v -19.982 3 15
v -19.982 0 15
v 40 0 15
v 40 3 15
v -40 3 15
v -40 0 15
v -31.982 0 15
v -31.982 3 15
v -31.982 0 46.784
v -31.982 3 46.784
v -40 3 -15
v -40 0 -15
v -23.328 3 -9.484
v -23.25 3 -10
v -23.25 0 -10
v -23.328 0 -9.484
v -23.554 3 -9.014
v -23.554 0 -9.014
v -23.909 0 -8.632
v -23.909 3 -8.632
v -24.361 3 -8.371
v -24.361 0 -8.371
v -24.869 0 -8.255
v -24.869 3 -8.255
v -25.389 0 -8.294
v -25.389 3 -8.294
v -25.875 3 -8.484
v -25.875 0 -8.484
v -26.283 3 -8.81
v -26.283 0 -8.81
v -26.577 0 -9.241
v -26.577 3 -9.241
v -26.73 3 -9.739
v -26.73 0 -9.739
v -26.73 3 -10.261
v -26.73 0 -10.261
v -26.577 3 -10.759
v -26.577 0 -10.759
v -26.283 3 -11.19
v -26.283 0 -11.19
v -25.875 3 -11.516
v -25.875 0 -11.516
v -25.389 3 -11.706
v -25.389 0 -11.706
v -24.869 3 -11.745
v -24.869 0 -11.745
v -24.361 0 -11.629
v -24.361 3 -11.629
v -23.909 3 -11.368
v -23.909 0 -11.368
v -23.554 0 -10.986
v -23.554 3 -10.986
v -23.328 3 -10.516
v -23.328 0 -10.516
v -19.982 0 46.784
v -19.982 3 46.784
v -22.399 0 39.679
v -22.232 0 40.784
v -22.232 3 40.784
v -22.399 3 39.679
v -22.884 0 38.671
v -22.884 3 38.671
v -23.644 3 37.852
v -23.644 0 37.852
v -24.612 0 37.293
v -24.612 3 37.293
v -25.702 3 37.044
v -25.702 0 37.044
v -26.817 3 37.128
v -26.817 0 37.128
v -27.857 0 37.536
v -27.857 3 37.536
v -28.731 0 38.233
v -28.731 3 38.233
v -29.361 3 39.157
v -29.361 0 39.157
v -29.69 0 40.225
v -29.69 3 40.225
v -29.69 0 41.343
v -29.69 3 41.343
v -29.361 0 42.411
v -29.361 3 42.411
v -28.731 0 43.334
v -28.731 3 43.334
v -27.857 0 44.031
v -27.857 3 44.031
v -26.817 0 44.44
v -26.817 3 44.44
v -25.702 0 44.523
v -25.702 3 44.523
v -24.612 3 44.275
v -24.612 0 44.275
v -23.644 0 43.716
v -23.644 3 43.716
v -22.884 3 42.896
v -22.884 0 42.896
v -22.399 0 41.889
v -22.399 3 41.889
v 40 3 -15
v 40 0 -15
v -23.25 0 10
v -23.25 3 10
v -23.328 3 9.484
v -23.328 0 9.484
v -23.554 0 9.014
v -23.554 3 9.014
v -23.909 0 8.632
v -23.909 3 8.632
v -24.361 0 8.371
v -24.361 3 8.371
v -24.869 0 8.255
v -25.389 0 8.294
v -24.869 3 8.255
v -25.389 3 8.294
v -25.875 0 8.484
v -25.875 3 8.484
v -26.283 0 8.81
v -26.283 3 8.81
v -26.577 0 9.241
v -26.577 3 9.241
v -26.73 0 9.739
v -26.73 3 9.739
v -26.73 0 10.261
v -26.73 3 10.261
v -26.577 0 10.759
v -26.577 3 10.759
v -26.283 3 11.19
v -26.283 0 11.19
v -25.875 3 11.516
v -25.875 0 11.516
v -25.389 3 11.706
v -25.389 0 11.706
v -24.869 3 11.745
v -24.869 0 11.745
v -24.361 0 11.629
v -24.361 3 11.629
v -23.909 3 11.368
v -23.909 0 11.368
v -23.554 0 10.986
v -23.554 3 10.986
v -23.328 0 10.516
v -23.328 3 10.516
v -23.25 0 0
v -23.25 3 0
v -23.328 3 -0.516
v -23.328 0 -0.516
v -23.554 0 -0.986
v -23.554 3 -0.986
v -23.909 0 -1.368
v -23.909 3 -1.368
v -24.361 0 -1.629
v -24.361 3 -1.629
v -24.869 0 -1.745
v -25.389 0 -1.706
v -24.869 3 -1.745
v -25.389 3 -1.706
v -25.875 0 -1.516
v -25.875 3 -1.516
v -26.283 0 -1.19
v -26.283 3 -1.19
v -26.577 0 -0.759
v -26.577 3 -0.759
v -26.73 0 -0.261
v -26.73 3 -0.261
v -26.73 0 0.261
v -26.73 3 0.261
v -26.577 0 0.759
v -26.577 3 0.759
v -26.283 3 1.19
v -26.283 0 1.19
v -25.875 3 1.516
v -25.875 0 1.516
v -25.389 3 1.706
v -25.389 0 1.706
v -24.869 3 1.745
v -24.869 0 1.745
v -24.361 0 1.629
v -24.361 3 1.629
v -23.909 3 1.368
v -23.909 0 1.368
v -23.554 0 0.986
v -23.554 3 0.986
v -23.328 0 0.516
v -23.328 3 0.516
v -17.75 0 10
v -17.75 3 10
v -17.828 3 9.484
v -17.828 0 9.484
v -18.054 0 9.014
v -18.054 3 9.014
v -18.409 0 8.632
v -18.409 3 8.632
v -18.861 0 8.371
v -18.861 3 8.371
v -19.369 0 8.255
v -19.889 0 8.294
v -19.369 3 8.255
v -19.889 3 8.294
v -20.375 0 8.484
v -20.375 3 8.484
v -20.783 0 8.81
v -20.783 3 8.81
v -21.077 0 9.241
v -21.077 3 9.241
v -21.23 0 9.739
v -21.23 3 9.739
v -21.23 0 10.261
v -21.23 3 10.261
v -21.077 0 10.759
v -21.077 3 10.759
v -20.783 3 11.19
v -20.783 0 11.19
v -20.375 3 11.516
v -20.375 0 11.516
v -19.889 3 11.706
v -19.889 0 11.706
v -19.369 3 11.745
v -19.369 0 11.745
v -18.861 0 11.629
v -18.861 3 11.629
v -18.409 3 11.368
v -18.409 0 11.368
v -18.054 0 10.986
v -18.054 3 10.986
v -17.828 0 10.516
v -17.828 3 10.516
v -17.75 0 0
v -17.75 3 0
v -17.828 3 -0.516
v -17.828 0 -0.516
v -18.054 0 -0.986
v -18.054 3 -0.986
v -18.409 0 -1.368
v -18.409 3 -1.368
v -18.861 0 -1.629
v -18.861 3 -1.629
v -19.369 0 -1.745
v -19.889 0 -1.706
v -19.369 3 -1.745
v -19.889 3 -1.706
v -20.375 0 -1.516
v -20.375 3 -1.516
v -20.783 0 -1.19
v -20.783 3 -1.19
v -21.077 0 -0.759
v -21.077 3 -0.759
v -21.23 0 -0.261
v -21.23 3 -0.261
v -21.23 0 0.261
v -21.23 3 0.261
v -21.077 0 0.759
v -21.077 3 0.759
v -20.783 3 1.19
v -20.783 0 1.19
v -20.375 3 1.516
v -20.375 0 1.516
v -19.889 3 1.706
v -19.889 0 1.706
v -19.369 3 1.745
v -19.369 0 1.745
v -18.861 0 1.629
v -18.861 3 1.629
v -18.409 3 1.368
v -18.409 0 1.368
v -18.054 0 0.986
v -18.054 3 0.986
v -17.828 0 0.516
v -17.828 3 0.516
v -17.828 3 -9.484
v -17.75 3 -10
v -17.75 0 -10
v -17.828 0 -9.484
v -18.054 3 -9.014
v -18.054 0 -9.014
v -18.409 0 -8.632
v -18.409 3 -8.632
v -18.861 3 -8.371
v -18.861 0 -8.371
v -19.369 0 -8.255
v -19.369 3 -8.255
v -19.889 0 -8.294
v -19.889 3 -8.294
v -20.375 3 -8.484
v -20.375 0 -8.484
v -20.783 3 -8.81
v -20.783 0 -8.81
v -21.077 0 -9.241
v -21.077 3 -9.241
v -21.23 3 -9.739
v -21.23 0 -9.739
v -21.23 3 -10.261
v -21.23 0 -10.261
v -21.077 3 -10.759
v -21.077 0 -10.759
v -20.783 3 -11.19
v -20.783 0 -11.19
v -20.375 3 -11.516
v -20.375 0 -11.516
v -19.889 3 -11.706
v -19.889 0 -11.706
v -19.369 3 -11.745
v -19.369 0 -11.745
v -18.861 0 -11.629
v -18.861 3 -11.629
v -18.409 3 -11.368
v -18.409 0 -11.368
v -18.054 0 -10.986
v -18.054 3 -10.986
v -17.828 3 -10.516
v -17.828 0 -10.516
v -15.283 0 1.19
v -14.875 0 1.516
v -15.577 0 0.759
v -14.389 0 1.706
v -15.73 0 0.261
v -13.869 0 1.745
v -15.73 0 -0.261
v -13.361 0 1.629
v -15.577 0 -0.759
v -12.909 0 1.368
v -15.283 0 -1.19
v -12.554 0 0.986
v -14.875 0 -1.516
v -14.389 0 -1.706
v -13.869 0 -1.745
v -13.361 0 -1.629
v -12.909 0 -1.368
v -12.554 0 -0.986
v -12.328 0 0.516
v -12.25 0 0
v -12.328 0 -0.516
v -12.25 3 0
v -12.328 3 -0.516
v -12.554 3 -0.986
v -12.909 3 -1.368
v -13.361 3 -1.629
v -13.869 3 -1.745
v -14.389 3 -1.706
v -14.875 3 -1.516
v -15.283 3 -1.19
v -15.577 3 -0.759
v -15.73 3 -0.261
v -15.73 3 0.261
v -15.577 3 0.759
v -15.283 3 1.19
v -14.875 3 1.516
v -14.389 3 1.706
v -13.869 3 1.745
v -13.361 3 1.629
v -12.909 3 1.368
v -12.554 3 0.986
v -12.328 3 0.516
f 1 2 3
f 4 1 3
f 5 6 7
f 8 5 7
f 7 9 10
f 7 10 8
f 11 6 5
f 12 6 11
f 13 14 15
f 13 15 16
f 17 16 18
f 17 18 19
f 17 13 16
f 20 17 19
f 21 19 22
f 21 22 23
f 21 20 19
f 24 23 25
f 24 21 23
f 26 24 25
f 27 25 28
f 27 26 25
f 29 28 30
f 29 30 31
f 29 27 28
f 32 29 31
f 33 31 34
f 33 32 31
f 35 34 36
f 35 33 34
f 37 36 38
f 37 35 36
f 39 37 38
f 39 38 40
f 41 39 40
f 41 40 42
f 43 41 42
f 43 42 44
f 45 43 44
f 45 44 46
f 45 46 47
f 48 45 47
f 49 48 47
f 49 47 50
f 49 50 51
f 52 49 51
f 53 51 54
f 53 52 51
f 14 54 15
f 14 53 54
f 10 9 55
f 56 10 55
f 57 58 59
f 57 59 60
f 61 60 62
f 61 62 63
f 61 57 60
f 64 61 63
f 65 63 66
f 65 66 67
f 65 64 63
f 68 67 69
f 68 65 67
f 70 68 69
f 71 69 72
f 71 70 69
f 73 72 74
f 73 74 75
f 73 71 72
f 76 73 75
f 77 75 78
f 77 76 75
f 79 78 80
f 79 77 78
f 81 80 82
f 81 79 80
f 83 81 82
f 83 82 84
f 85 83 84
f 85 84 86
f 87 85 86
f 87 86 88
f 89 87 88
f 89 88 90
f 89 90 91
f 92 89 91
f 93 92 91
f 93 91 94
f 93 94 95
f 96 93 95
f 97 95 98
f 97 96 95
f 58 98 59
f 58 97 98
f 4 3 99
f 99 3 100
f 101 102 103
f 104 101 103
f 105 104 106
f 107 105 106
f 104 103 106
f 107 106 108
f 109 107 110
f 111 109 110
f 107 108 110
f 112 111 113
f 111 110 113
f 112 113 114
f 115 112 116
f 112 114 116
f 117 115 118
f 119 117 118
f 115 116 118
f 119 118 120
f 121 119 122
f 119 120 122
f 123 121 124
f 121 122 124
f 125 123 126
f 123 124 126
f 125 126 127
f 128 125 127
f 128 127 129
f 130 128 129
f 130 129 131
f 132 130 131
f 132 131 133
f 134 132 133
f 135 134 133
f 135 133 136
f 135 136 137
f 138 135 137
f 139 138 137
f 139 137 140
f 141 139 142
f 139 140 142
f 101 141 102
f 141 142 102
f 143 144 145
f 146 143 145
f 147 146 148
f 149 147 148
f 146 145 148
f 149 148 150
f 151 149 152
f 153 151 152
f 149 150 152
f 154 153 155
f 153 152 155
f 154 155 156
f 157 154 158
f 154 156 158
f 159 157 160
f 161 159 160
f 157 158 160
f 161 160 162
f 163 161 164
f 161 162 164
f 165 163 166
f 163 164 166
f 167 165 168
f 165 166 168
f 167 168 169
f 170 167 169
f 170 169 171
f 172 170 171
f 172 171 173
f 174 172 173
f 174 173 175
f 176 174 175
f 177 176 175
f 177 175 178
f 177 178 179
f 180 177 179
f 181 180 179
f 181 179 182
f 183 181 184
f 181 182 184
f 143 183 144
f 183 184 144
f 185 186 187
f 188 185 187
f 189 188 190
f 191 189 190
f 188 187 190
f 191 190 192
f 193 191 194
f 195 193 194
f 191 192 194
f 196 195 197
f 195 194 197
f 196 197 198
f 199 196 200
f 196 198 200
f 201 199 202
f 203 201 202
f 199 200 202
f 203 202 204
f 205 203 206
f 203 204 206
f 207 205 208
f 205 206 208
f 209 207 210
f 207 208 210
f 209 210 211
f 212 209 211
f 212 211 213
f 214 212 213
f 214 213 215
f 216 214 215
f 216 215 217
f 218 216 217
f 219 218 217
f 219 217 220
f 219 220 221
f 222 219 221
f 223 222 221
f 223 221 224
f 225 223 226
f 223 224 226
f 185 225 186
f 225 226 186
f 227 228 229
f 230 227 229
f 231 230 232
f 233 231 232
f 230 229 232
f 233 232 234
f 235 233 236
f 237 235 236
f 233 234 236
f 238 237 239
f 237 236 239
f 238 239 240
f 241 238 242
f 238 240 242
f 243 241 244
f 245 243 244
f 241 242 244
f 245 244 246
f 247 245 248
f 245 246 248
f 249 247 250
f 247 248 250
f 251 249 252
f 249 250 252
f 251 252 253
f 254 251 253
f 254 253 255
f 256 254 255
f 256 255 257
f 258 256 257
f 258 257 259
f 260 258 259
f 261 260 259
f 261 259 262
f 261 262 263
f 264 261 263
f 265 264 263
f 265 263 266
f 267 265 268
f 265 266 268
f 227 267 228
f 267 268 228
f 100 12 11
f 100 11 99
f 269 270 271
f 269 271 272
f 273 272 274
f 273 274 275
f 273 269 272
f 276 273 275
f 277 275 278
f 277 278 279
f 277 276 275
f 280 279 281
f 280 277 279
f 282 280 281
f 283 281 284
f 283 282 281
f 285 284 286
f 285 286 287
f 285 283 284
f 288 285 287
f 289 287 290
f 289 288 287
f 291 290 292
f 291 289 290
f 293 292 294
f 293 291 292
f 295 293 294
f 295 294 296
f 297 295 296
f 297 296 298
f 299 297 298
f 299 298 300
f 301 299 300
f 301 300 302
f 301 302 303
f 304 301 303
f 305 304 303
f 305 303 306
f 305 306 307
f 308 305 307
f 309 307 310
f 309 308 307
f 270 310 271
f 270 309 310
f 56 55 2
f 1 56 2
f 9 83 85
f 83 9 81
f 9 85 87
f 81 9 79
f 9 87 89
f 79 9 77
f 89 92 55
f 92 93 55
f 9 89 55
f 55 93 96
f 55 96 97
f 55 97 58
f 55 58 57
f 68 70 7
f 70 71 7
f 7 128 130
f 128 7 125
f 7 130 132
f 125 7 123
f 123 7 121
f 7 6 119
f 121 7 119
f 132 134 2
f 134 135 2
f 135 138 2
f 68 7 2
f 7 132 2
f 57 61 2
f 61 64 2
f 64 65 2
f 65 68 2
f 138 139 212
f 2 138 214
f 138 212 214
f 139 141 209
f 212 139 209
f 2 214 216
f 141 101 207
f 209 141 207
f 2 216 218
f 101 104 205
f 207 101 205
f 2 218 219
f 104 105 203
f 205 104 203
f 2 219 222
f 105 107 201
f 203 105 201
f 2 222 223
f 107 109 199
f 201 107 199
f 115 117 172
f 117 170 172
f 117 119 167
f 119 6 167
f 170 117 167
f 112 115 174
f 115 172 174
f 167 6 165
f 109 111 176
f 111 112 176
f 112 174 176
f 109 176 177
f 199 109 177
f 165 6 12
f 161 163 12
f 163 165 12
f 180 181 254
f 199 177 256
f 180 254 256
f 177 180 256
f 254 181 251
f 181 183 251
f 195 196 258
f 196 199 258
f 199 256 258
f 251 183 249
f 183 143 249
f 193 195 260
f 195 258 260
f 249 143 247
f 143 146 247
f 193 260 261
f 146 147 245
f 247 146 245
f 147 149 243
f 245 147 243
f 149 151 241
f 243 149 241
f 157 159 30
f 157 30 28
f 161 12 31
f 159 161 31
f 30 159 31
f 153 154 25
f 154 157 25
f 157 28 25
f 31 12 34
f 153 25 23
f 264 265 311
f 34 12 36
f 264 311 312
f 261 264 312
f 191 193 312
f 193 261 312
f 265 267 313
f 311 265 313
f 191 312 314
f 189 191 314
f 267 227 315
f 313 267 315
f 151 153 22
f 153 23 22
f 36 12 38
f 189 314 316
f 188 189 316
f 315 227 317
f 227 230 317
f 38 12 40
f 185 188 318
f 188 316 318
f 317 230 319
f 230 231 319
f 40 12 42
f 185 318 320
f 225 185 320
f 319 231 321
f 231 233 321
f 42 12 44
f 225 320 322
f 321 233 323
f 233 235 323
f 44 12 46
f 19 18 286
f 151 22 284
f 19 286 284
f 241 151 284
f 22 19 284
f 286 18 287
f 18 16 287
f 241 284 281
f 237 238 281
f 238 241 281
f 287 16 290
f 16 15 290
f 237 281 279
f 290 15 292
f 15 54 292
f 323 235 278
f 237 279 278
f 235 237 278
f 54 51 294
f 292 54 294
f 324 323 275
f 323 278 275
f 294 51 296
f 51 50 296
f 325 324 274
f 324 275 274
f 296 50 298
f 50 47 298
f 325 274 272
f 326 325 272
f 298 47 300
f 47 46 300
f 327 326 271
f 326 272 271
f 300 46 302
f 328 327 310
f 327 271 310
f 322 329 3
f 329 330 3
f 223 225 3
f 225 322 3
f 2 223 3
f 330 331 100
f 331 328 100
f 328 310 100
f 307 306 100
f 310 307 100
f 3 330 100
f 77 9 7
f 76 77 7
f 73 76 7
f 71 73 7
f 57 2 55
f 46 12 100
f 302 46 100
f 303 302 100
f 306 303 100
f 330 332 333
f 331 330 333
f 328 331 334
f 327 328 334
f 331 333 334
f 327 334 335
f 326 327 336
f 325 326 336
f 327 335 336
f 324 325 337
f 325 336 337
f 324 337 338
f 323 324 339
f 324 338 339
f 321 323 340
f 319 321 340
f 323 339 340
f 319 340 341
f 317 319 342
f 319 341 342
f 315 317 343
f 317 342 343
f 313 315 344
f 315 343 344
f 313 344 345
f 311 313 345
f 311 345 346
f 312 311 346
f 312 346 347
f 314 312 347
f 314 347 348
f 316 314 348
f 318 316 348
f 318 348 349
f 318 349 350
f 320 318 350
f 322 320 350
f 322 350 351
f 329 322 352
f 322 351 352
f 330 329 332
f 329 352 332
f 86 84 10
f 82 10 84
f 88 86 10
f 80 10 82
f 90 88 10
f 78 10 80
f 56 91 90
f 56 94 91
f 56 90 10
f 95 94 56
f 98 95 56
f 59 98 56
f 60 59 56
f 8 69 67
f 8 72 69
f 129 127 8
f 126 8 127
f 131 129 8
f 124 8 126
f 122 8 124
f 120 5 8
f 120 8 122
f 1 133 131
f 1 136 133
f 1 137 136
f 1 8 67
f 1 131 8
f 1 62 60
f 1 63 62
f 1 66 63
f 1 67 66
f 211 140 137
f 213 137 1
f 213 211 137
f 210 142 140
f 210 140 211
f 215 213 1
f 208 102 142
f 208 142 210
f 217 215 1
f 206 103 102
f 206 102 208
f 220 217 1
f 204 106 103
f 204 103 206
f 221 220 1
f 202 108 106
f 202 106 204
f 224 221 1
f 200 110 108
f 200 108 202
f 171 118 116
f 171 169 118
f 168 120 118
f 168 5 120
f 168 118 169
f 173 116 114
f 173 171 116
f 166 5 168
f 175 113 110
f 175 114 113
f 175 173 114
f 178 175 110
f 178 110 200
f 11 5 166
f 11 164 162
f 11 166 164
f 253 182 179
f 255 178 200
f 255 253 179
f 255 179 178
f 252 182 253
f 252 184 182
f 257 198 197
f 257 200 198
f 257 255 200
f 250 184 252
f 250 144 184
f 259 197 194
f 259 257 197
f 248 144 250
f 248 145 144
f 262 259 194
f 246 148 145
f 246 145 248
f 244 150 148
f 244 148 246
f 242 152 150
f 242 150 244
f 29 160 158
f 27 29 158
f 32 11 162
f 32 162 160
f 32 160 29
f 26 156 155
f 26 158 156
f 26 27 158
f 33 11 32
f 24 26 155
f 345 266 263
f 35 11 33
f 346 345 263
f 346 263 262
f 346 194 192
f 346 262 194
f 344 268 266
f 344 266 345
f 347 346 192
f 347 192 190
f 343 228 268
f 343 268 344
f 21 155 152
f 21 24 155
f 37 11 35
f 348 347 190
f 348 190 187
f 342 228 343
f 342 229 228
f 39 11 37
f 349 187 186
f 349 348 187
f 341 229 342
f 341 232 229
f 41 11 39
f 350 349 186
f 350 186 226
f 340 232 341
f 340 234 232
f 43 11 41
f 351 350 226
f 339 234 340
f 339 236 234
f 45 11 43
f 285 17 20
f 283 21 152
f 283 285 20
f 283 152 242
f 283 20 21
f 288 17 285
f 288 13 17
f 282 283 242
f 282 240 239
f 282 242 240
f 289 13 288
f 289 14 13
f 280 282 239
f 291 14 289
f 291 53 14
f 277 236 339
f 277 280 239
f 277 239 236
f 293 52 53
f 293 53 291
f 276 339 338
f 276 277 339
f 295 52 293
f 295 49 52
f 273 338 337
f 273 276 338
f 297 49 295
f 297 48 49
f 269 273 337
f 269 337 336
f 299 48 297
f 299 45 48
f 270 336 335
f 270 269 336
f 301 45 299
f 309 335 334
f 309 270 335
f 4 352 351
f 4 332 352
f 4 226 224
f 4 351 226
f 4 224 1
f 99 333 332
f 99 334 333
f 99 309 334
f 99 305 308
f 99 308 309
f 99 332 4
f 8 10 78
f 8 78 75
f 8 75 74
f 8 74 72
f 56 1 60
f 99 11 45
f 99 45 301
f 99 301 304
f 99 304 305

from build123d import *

# Parameters (mm, degrees)
SKETCH1_W           = 80
SKETCH1_H           = 30
BOSS_EXTRUDE1_DEPTH = 3
SKETCH2_R           = 1.75
CUT_EXTRUDE1_DEPTH  = 3
LPATTERN1_COUNT     = 3
LPATTERN1_PITCH     = 5.5
SKETCH3_R           = 1.75
CUT_EXTRUDE2_DEPTH  = 3
SKETCH4_W           = 12
SKETCH4_H           = 31.783850417
SKETCH4_R           = 3.75
BOSS_EXTRUDE2_DEPTH = 3


with BuildPart() as part:
    # Sketch1 → Boss-Extrude1 (new body)
    with BuildSketch(Plane(origin=(0, 0, 0), x_dir=(1, 0, 0), z_dir=(0, 1, 0))):
        Rectangle(SKETCH1_W, SKETCH1_H)
    extrude(amount=BOSS_EXTRUDE1_DEPTH)

    # Sketch2 → Cut-Extrude1 (cut)
    with BuildSketch(Plane(origin=(0, 3, 0), x_dir=(1, 0, 0), z_dir=(0, 1, 0))):
        with Locations((-25, 0)):
            Circle(SKETCH2_R)
    cut_extrude1 = extrude(amount=-CUT_EXTRUDE1_DEPTH, mode=Mode.SUBTRACT)

    # LPattern1: Cut-Extrude1 ×3
    with Locations(*[(i * LPATTERN1_PITCH, 0, 0) for i in range(1, LPATTERN1_COUNT)]):
        add(cut_extrude1, mode=Mode.SUBTRACT)

    # Sketch3 → Cut-Extrude2 (cut)
    with BuildSketch(Plane(origin=(0, 3, 0), x_dir=(1, 0, 0), z_dir=(0, 1, 0))):
        with Locations((-25, -10)):
            Circle(SKETCH3_R)
        with Locations((-19.5, -10)):
            Circle(SKETCH3_R)
    cut_extrude2 = extrude(amount=-CUT_EXTRUDE2_DEPTH, mode=Mode.SUBTRACT)

    # Mirror1: Cut-Extrude2 across plane
    add(cut_extrude2.mirror(Plane.XY), mode=Mode.SUBTRACT)

    # Sketch4 → Boss-Extrude2 (add)
    with BuildSketch(Plane(origin=(0, 0, 0), x_dir=(1, 0, 0), z_dir=(0, 1, 0))):
        with Locations((-25.982178222, -30.891925209)):
            Rectangle(SKETCH4_W, SKETCH4_H)
        with Locations((-25.982178222, -40.783850417)):
            Circle(SKETCH4_R, mode=Mode.SUBTRACT)
    extrude(amount=BOSS_EXTRUDE2_DEPTH)


solid = part.part
